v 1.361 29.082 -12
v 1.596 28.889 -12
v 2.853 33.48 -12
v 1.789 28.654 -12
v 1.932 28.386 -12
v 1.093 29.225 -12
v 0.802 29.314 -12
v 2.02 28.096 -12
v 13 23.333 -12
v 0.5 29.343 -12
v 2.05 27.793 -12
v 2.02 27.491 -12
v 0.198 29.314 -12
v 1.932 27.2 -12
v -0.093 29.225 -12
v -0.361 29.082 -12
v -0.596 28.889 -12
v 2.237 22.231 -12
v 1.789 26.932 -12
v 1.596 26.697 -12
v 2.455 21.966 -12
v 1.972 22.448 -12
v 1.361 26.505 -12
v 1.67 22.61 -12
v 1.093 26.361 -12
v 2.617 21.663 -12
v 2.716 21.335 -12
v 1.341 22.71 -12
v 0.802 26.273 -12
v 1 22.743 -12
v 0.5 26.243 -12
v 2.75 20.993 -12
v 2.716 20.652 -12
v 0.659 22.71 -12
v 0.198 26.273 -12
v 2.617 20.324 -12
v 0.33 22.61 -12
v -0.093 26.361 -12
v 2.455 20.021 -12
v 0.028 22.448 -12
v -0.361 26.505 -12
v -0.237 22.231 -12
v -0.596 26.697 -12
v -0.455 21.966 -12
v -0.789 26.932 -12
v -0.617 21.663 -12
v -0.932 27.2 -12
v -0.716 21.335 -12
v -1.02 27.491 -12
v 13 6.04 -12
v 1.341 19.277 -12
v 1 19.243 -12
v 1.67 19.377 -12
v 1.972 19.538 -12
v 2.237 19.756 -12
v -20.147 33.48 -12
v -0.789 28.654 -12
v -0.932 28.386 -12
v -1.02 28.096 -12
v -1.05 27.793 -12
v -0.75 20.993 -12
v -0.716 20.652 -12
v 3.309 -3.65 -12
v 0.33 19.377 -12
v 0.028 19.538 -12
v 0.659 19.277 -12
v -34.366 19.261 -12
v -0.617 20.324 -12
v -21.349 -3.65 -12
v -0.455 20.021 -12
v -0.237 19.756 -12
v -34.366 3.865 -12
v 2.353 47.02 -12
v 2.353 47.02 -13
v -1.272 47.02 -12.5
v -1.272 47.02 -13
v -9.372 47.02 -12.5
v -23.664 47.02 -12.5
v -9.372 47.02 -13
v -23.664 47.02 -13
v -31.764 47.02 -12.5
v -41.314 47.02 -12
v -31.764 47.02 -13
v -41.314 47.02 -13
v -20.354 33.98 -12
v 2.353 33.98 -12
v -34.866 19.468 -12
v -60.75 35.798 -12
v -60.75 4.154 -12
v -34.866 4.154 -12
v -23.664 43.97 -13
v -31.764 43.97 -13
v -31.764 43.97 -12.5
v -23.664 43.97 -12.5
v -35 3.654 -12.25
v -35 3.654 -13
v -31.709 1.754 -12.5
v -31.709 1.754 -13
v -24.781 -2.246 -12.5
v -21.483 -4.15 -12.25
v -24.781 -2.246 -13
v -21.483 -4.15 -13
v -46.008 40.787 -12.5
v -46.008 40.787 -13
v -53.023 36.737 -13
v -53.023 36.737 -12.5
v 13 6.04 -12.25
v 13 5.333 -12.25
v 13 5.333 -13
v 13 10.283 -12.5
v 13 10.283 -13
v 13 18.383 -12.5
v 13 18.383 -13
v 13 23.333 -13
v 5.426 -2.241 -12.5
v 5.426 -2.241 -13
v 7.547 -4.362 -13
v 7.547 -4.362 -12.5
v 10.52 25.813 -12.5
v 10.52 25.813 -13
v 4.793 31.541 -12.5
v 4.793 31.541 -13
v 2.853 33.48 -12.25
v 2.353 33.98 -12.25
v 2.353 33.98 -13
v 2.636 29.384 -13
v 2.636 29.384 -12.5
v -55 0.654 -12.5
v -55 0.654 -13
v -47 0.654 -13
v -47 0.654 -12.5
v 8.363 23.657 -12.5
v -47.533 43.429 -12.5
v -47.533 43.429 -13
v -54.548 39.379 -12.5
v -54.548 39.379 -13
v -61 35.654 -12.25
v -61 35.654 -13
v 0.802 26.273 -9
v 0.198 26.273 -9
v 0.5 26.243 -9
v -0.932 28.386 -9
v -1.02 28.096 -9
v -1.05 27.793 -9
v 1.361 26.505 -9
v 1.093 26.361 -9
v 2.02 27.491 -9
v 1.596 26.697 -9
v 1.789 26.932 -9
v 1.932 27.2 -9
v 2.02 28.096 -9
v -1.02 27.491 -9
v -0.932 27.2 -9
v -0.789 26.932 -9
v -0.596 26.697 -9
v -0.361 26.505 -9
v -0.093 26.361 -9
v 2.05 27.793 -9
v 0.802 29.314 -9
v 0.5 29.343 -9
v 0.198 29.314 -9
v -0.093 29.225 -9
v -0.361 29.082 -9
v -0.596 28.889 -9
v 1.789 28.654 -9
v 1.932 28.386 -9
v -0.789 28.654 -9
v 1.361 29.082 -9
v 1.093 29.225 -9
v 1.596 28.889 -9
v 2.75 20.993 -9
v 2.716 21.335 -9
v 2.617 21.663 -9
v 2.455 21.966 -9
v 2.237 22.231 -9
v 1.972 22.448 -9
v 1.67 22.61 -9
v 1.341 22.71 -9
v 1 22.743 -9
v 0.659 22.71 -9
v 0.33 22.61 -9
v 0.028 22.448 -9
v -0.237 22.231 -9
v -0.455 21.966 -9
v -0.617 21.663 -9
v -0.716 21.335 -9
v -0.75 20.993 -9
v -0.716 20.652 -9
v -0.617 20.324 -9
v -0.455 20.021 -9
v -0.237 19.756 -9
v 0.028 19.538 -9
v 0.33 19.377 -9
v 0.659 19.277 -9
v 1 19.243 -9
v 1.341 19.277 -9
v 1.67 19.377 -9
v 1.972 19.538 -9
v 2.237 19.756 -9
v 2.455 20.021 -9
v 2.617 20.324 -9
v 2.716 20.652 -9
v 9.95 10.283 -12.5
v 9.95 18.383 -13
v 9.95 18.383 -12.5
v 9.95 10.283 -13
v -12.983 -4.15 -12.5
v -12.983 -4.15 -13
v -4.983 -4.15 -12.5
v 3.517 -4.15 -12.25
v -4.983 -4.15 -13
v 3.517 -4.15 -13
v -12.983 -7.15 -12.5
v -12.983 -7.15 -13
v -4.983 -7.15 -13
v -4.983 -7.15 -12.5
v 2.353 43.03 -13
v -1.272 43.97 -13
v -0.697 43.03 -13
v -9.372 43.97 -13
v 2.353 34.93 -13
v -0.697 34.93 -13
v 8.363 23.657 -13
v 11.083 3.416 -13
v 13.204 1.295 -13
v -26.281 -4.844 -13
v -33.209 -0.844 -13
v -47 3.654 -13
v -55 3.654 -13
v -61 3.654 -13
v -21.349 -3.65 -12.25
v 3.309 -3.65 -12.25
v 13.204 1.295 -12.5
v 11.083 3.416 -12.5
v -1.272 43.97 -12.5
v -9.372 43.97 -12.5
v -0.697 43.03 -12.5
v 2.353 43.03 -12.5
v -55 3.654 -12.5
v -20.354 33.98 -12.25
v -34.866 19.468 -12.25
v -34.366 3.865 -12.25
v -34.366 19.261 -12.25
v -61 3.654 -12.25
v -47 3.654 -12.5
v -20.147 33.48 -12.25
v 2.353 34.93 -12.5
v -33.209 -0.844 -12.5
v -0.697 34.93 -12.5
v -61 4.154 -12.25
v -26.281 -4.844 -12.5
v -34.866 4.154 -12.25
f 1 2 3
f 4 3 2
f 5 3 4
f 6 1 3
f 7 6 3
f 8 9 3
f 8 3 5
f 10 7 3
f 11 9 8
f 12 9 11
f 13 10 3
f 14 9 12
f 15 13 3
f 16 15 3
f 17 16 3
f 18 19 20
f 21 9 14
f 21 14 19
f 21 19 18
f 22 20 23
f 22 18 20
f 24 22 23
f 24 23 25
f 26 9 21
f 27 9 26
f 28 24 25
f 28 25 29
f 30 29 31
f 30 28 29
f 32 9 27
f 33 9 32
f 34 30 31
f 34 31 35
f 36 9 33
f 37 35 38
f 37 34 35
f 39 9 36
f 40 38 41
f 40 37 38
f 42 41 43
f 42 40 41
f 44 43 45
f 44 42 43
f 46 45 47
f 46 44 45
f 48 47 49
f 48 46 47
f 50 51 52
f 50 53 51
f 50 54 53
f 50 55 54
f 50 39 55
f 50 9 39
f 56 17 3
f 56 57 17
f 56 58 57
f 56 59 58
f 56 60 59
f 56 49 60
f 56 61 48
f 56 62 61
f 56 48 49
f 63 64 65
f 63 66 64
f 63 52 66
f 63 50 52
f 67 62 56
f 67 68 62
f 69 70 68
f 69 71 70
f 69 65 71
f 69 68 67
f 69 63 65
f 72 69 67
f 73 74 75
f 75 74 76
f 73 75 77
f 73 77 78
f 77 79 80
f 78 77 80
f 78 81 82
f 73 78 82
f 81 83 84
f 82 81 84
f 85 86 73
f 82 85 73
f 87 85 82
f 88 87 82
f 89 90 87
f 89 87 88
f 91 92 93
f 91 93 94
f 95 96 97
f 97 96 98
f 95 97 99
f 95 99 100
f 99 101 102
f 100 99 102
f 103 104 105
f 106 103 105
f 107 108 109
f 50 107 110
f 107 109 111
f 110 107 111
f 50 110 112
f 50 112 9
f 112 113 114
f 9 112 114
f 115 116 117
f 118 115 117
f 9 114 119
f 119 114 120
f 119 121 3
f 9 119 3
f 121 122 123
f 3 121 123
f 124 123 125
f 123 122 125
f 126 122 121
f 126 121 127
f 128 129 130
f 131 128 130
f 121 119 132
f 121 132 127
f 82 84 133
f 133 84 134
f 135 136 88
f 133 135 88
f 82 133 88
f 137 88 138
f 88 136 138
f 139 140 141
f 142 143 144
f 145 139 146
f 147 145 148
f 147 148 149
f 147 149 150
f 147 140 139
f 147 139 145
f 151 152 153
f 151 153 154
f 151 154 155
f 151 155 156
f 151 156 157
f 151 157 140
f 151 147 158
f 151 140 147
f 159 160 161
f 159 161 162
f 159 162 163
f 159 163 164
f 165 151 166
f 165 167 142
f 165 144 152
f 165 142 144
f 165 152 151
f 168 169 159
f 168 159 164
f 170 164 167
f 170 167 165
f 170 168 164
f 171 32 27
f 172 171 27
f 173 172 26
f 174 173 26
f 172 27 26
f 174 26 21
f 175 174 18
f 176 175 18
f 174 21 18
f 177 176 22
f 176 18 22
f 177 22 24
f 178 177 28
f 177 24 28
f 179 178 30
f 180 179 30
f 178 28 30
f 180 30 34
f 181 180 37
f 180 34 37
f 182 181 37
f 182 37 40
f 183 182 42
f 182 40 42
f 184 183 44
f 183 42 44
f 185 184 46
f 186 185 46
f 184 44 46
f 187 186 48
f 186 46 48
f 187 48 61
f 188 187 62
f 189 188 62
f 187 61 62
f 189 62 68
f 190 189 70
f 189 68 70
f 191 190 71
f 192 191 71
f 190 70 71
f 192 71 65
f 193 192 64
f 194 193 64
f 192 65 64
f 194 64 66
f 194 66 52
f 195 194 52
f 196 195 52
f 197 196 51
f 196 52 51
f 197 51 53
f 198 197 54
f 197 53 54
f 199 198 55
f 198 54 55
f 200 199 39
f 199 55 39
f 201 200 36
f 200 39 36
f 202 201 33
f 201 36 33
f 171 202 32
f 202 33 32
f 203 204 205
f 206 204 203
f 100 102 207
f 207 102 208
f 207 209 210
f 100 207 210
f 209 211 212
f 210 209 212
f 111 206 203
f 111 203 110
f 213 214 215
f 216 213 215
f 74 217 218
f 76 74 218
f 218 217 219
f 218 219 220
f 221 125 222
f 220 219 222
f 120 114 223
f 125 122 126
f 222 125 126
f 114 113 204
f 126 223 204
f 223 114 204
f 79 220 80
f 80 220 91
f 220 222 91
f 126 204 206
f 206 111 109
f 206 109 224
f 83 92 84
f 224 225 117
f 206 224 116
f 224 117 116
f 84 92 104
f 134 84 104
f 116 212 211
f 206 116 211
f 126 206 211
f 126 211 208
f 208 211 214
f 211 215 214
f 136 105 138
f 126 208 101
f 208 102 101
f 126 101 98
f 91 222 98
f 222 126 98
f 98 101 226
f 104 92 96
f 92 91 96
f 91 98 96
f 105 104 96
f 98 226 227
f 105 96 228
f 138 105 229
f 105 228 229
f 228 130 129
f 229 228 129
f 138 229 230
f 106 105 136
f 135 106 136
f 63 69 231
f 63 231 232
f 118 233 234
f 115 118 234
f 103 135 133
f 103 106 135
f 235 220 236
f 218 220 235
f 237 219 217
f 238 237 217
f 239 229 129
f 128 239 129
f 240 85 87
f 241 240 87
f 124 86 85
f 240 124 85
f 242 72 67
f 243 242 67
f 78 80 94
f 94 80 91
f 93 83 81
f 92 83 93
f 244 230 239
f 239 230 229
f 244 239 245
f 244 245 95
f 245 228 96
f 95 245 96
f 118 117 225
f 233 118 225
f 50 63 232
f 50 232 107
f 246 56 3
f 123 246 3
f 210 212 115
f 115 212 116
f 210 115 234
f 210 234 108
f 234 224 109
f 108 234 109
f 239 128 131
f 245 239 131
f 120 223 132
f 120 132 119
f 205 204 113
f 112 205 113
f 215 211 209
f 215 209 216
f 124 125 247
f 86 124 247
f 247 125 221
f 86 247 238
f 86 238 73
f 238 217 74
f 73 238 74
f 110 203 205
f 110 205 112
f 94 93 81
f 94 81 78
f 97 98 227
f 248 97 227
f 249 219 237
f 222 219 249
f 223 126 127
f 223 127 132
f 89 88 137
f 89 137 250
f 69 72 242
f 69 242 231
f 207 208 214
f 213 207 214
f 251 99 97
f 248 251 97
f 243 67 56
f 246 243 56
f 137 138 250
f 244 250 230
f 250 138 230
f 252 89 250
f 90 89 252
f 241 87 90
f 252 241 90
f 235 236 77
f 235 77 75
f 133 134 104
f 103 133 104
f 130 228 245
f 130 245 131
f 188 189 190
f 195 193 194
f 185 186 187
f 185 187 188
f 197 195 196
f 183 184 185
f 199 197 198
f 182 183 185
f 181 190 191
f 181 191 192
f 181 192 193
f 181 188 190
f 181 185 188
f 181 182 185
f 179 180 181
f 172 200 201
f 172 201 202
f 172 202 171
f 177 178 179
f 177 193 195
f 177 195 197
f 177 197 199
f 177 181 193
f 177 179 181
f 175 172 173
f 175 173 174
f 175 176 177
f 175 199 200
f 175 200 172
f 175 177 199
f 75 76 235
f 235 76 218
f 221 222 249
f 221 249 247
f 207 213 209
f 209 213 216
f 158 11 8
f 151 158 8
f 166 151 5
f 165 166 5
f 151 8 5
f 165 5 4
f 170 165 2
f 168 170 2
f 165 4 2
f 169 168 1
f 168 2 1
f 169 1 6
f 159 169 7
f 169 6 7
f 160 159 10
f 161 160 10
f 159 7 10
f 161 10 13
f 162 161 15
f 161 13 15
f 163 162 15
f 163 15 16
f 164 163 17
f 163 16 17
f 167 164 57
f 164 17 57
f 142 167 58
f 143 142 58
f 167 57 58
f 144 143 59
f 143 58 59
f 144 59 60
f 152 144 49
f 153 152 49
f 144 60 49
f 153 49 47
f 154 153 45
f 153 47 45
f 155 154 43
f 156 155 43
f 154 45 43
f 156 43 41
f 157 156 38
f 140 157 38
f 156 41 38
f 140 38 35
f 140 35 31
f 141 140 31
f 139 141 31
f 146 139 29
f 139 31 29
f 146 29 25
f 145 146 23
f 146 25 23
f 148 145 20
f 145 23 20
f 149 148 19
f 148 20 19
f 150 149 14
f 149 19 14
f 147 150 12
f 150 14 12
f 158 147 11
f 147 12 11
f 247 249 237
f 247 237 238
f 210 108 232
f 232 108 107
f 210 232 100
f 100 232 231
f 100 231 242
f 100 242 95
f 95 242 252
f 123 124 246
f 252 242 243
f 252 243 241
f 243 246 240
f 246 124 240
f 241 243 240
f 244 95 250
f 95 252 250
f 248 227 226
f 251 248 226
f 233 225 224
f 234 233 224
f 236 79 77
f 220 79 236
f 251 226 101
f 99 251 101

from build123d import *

# Parameters (mm, degrees)
PAD027_DEPTH    = 1
SKETCH043_W     = 3.05
SKETCH043_H     = 8.1
SKETCH043_W_2   = 8.1
SKETCH043_H_2   = 3.05
POCKET016_DEPTH = 0.5
POCKET017_DEPTH = 0.25
POCKET018_DEPTH = 0.25
CHAMFER007_SIZE = 0.25
SKETCH046_W     = 8
SKETCH046_H     = 3
PAD028_DEPTH    = 0.5
SKETCH047_R     = 1.55
SKETCH047_R_2   = 1.75
PAD029_DEPTH    = 3


with BuildPart() as part:
    # Sketch042 (on Face1 of Binder013) → Pad027 (new body)
    with BuildSketch(Plane(origin=(0, 0, -13), x_dir=(1, 0, 0), z_dir=(0, 0, -1))):
        Polygon((13, -5.333333), (13, -23.333333), (2.352991501, -33.980341499), (2.352991501, -47.019624501), (-41.313708499, -47.019624501), (-61, -35.6537388036), (-61, -3.6537388036), (-35, -3.6537388036), (-21.4834043405, 4.1500713405), (3.5165956595, 4.1500713405), align=None)
    extrude(amount=-PAD027_DEPTH)

    # Sketch043 (on Face11 of Pad027) → Pocket016 (cut)
    with BuildSketch(Plane(origin=(0, 0, -13), x_dir=(1, 0, 0), z_dir=(0, 0, -1))):
        with Locations((11.475, -14.333333)):
            Rectangle(SKETCH043_W, SKETCH043_H)
        with Locations((0.827991501, -38.979624501)):
            Rectangle(SKETCH043_W, SKETCH043_H)
        with Locations((-5.322008499, -45.494624501)):
            Rectangle(SKETCH043_W_2, SKETCH043_H_2)
        with Locations((-27.713708499, -45.494624501)):
            Rectangle(SKETCH043_W_2, SKETCH043_H_2)
        Polygon((-54.5481107418, -39.3787388036), (-47.5333049711, -43.4287388036), (-46.0083049711, -40.787361322), (-53.0231107418, -36.737361322), align=None)
        Polygon((10.5200748237, -25.8132581763), (4.7925098961, -31.5408231039), (2.6358342135, -29.3841474213), (8.3633991411, -23.6565824937), align=None)
    extrude(amount=-POCKET016_DEPTH, mode=Mode.SUBTRACT)

    # Sketch044 (on Face7 of Pocket016) → Pocket017 (cut)
    with BuildSketch(Plane.XY.offset(-12)):
        Polygon((13, 5.333333), (3.5165956595, -4.1500713405), (-21.4834043405, -4.1500713405), (-35, 3.6537388036), (-61, 3.6537388036), (-61, 4.1537388036), (-34.8660254038, 4.1537388036), (-21.3494297442, -3.6500713405), (3.3094888783, -3.6500713405), (13, 6.0404397812), align=None)
    extrude(amount=-POCKET017_DEPTH, mode=Mode.SUBTRACT)

    # Sketch045 (on Face7 of Pocket017) → Pocket018 (cut)
    with BuildSketch(Plane.XY.offset(-12)):
        Polygon((2.352991501, 33.980341499), (-20.3541152802, 33.980341499), (-34.8660254038, 19.4684313754), (-34.8660254038, 4.1537388036), (-34.3660254038, 3.8650636689), (-34.3660254038, 19.2613245942), (-20.147008499, 33.480341499), (2.852991501, 33.480341499), align=None)
    extrude(amount=-POCKET018_DEPTH, mode=Mode.SUBTRACT)

    # Chamfer007
    chamfer007_edges = [part.edges().sort_by_distance(p)[0] for p in [
        (-61, 19.903739, -12),
    ]]
    chamfer(chamfer007_edges, length=CHAMFER007_SIZE)

    # Sketch046 (on Face4 of Chamfer007) → Pad028 (join)
    with BuildSketch(Plane(origin=(0, 0, -13), x_dir=(1, 0, 0), z_dir=(0, 0, -1))):
        with Locations((-51, -2.1537388036)):
            Rectangle(SKETCH046_W, SKETCH046_H)
        with Locations((-8.9834043405, 5.6500713405)):
            Rectangle(SKETCH046_W, SKETCH046_H)
        Polygon((-24.7809002358, 2.2462611973), (-31.7091034658, -1.7537388033), (-33.209103466, 0.8443374079), (-26.2809002361, 4.8443374085), align=None)
        Polygon((11.0826382182, -3.4159712182), (5.4257839687, 2.2408830313), (7.5471043123, 4.3622033748), (13.2039585618, -1.2946508747), align=None)
    extrude(amount=-PAD028_DEPTH)

    # Sketch047 (on Face63 of Pad028) → Pad029 (join)
    with BuildSketch(Plane.XY.offset(-12)):
        with Locations((0.5, 27.793333)):
            Circle(SKETCH047_R)
        with Locations((1, 20.993333)):
            Circle(SKETCH047_R_2)
    extrude(amount=PAD029_DEPTH)


solid = part.part
